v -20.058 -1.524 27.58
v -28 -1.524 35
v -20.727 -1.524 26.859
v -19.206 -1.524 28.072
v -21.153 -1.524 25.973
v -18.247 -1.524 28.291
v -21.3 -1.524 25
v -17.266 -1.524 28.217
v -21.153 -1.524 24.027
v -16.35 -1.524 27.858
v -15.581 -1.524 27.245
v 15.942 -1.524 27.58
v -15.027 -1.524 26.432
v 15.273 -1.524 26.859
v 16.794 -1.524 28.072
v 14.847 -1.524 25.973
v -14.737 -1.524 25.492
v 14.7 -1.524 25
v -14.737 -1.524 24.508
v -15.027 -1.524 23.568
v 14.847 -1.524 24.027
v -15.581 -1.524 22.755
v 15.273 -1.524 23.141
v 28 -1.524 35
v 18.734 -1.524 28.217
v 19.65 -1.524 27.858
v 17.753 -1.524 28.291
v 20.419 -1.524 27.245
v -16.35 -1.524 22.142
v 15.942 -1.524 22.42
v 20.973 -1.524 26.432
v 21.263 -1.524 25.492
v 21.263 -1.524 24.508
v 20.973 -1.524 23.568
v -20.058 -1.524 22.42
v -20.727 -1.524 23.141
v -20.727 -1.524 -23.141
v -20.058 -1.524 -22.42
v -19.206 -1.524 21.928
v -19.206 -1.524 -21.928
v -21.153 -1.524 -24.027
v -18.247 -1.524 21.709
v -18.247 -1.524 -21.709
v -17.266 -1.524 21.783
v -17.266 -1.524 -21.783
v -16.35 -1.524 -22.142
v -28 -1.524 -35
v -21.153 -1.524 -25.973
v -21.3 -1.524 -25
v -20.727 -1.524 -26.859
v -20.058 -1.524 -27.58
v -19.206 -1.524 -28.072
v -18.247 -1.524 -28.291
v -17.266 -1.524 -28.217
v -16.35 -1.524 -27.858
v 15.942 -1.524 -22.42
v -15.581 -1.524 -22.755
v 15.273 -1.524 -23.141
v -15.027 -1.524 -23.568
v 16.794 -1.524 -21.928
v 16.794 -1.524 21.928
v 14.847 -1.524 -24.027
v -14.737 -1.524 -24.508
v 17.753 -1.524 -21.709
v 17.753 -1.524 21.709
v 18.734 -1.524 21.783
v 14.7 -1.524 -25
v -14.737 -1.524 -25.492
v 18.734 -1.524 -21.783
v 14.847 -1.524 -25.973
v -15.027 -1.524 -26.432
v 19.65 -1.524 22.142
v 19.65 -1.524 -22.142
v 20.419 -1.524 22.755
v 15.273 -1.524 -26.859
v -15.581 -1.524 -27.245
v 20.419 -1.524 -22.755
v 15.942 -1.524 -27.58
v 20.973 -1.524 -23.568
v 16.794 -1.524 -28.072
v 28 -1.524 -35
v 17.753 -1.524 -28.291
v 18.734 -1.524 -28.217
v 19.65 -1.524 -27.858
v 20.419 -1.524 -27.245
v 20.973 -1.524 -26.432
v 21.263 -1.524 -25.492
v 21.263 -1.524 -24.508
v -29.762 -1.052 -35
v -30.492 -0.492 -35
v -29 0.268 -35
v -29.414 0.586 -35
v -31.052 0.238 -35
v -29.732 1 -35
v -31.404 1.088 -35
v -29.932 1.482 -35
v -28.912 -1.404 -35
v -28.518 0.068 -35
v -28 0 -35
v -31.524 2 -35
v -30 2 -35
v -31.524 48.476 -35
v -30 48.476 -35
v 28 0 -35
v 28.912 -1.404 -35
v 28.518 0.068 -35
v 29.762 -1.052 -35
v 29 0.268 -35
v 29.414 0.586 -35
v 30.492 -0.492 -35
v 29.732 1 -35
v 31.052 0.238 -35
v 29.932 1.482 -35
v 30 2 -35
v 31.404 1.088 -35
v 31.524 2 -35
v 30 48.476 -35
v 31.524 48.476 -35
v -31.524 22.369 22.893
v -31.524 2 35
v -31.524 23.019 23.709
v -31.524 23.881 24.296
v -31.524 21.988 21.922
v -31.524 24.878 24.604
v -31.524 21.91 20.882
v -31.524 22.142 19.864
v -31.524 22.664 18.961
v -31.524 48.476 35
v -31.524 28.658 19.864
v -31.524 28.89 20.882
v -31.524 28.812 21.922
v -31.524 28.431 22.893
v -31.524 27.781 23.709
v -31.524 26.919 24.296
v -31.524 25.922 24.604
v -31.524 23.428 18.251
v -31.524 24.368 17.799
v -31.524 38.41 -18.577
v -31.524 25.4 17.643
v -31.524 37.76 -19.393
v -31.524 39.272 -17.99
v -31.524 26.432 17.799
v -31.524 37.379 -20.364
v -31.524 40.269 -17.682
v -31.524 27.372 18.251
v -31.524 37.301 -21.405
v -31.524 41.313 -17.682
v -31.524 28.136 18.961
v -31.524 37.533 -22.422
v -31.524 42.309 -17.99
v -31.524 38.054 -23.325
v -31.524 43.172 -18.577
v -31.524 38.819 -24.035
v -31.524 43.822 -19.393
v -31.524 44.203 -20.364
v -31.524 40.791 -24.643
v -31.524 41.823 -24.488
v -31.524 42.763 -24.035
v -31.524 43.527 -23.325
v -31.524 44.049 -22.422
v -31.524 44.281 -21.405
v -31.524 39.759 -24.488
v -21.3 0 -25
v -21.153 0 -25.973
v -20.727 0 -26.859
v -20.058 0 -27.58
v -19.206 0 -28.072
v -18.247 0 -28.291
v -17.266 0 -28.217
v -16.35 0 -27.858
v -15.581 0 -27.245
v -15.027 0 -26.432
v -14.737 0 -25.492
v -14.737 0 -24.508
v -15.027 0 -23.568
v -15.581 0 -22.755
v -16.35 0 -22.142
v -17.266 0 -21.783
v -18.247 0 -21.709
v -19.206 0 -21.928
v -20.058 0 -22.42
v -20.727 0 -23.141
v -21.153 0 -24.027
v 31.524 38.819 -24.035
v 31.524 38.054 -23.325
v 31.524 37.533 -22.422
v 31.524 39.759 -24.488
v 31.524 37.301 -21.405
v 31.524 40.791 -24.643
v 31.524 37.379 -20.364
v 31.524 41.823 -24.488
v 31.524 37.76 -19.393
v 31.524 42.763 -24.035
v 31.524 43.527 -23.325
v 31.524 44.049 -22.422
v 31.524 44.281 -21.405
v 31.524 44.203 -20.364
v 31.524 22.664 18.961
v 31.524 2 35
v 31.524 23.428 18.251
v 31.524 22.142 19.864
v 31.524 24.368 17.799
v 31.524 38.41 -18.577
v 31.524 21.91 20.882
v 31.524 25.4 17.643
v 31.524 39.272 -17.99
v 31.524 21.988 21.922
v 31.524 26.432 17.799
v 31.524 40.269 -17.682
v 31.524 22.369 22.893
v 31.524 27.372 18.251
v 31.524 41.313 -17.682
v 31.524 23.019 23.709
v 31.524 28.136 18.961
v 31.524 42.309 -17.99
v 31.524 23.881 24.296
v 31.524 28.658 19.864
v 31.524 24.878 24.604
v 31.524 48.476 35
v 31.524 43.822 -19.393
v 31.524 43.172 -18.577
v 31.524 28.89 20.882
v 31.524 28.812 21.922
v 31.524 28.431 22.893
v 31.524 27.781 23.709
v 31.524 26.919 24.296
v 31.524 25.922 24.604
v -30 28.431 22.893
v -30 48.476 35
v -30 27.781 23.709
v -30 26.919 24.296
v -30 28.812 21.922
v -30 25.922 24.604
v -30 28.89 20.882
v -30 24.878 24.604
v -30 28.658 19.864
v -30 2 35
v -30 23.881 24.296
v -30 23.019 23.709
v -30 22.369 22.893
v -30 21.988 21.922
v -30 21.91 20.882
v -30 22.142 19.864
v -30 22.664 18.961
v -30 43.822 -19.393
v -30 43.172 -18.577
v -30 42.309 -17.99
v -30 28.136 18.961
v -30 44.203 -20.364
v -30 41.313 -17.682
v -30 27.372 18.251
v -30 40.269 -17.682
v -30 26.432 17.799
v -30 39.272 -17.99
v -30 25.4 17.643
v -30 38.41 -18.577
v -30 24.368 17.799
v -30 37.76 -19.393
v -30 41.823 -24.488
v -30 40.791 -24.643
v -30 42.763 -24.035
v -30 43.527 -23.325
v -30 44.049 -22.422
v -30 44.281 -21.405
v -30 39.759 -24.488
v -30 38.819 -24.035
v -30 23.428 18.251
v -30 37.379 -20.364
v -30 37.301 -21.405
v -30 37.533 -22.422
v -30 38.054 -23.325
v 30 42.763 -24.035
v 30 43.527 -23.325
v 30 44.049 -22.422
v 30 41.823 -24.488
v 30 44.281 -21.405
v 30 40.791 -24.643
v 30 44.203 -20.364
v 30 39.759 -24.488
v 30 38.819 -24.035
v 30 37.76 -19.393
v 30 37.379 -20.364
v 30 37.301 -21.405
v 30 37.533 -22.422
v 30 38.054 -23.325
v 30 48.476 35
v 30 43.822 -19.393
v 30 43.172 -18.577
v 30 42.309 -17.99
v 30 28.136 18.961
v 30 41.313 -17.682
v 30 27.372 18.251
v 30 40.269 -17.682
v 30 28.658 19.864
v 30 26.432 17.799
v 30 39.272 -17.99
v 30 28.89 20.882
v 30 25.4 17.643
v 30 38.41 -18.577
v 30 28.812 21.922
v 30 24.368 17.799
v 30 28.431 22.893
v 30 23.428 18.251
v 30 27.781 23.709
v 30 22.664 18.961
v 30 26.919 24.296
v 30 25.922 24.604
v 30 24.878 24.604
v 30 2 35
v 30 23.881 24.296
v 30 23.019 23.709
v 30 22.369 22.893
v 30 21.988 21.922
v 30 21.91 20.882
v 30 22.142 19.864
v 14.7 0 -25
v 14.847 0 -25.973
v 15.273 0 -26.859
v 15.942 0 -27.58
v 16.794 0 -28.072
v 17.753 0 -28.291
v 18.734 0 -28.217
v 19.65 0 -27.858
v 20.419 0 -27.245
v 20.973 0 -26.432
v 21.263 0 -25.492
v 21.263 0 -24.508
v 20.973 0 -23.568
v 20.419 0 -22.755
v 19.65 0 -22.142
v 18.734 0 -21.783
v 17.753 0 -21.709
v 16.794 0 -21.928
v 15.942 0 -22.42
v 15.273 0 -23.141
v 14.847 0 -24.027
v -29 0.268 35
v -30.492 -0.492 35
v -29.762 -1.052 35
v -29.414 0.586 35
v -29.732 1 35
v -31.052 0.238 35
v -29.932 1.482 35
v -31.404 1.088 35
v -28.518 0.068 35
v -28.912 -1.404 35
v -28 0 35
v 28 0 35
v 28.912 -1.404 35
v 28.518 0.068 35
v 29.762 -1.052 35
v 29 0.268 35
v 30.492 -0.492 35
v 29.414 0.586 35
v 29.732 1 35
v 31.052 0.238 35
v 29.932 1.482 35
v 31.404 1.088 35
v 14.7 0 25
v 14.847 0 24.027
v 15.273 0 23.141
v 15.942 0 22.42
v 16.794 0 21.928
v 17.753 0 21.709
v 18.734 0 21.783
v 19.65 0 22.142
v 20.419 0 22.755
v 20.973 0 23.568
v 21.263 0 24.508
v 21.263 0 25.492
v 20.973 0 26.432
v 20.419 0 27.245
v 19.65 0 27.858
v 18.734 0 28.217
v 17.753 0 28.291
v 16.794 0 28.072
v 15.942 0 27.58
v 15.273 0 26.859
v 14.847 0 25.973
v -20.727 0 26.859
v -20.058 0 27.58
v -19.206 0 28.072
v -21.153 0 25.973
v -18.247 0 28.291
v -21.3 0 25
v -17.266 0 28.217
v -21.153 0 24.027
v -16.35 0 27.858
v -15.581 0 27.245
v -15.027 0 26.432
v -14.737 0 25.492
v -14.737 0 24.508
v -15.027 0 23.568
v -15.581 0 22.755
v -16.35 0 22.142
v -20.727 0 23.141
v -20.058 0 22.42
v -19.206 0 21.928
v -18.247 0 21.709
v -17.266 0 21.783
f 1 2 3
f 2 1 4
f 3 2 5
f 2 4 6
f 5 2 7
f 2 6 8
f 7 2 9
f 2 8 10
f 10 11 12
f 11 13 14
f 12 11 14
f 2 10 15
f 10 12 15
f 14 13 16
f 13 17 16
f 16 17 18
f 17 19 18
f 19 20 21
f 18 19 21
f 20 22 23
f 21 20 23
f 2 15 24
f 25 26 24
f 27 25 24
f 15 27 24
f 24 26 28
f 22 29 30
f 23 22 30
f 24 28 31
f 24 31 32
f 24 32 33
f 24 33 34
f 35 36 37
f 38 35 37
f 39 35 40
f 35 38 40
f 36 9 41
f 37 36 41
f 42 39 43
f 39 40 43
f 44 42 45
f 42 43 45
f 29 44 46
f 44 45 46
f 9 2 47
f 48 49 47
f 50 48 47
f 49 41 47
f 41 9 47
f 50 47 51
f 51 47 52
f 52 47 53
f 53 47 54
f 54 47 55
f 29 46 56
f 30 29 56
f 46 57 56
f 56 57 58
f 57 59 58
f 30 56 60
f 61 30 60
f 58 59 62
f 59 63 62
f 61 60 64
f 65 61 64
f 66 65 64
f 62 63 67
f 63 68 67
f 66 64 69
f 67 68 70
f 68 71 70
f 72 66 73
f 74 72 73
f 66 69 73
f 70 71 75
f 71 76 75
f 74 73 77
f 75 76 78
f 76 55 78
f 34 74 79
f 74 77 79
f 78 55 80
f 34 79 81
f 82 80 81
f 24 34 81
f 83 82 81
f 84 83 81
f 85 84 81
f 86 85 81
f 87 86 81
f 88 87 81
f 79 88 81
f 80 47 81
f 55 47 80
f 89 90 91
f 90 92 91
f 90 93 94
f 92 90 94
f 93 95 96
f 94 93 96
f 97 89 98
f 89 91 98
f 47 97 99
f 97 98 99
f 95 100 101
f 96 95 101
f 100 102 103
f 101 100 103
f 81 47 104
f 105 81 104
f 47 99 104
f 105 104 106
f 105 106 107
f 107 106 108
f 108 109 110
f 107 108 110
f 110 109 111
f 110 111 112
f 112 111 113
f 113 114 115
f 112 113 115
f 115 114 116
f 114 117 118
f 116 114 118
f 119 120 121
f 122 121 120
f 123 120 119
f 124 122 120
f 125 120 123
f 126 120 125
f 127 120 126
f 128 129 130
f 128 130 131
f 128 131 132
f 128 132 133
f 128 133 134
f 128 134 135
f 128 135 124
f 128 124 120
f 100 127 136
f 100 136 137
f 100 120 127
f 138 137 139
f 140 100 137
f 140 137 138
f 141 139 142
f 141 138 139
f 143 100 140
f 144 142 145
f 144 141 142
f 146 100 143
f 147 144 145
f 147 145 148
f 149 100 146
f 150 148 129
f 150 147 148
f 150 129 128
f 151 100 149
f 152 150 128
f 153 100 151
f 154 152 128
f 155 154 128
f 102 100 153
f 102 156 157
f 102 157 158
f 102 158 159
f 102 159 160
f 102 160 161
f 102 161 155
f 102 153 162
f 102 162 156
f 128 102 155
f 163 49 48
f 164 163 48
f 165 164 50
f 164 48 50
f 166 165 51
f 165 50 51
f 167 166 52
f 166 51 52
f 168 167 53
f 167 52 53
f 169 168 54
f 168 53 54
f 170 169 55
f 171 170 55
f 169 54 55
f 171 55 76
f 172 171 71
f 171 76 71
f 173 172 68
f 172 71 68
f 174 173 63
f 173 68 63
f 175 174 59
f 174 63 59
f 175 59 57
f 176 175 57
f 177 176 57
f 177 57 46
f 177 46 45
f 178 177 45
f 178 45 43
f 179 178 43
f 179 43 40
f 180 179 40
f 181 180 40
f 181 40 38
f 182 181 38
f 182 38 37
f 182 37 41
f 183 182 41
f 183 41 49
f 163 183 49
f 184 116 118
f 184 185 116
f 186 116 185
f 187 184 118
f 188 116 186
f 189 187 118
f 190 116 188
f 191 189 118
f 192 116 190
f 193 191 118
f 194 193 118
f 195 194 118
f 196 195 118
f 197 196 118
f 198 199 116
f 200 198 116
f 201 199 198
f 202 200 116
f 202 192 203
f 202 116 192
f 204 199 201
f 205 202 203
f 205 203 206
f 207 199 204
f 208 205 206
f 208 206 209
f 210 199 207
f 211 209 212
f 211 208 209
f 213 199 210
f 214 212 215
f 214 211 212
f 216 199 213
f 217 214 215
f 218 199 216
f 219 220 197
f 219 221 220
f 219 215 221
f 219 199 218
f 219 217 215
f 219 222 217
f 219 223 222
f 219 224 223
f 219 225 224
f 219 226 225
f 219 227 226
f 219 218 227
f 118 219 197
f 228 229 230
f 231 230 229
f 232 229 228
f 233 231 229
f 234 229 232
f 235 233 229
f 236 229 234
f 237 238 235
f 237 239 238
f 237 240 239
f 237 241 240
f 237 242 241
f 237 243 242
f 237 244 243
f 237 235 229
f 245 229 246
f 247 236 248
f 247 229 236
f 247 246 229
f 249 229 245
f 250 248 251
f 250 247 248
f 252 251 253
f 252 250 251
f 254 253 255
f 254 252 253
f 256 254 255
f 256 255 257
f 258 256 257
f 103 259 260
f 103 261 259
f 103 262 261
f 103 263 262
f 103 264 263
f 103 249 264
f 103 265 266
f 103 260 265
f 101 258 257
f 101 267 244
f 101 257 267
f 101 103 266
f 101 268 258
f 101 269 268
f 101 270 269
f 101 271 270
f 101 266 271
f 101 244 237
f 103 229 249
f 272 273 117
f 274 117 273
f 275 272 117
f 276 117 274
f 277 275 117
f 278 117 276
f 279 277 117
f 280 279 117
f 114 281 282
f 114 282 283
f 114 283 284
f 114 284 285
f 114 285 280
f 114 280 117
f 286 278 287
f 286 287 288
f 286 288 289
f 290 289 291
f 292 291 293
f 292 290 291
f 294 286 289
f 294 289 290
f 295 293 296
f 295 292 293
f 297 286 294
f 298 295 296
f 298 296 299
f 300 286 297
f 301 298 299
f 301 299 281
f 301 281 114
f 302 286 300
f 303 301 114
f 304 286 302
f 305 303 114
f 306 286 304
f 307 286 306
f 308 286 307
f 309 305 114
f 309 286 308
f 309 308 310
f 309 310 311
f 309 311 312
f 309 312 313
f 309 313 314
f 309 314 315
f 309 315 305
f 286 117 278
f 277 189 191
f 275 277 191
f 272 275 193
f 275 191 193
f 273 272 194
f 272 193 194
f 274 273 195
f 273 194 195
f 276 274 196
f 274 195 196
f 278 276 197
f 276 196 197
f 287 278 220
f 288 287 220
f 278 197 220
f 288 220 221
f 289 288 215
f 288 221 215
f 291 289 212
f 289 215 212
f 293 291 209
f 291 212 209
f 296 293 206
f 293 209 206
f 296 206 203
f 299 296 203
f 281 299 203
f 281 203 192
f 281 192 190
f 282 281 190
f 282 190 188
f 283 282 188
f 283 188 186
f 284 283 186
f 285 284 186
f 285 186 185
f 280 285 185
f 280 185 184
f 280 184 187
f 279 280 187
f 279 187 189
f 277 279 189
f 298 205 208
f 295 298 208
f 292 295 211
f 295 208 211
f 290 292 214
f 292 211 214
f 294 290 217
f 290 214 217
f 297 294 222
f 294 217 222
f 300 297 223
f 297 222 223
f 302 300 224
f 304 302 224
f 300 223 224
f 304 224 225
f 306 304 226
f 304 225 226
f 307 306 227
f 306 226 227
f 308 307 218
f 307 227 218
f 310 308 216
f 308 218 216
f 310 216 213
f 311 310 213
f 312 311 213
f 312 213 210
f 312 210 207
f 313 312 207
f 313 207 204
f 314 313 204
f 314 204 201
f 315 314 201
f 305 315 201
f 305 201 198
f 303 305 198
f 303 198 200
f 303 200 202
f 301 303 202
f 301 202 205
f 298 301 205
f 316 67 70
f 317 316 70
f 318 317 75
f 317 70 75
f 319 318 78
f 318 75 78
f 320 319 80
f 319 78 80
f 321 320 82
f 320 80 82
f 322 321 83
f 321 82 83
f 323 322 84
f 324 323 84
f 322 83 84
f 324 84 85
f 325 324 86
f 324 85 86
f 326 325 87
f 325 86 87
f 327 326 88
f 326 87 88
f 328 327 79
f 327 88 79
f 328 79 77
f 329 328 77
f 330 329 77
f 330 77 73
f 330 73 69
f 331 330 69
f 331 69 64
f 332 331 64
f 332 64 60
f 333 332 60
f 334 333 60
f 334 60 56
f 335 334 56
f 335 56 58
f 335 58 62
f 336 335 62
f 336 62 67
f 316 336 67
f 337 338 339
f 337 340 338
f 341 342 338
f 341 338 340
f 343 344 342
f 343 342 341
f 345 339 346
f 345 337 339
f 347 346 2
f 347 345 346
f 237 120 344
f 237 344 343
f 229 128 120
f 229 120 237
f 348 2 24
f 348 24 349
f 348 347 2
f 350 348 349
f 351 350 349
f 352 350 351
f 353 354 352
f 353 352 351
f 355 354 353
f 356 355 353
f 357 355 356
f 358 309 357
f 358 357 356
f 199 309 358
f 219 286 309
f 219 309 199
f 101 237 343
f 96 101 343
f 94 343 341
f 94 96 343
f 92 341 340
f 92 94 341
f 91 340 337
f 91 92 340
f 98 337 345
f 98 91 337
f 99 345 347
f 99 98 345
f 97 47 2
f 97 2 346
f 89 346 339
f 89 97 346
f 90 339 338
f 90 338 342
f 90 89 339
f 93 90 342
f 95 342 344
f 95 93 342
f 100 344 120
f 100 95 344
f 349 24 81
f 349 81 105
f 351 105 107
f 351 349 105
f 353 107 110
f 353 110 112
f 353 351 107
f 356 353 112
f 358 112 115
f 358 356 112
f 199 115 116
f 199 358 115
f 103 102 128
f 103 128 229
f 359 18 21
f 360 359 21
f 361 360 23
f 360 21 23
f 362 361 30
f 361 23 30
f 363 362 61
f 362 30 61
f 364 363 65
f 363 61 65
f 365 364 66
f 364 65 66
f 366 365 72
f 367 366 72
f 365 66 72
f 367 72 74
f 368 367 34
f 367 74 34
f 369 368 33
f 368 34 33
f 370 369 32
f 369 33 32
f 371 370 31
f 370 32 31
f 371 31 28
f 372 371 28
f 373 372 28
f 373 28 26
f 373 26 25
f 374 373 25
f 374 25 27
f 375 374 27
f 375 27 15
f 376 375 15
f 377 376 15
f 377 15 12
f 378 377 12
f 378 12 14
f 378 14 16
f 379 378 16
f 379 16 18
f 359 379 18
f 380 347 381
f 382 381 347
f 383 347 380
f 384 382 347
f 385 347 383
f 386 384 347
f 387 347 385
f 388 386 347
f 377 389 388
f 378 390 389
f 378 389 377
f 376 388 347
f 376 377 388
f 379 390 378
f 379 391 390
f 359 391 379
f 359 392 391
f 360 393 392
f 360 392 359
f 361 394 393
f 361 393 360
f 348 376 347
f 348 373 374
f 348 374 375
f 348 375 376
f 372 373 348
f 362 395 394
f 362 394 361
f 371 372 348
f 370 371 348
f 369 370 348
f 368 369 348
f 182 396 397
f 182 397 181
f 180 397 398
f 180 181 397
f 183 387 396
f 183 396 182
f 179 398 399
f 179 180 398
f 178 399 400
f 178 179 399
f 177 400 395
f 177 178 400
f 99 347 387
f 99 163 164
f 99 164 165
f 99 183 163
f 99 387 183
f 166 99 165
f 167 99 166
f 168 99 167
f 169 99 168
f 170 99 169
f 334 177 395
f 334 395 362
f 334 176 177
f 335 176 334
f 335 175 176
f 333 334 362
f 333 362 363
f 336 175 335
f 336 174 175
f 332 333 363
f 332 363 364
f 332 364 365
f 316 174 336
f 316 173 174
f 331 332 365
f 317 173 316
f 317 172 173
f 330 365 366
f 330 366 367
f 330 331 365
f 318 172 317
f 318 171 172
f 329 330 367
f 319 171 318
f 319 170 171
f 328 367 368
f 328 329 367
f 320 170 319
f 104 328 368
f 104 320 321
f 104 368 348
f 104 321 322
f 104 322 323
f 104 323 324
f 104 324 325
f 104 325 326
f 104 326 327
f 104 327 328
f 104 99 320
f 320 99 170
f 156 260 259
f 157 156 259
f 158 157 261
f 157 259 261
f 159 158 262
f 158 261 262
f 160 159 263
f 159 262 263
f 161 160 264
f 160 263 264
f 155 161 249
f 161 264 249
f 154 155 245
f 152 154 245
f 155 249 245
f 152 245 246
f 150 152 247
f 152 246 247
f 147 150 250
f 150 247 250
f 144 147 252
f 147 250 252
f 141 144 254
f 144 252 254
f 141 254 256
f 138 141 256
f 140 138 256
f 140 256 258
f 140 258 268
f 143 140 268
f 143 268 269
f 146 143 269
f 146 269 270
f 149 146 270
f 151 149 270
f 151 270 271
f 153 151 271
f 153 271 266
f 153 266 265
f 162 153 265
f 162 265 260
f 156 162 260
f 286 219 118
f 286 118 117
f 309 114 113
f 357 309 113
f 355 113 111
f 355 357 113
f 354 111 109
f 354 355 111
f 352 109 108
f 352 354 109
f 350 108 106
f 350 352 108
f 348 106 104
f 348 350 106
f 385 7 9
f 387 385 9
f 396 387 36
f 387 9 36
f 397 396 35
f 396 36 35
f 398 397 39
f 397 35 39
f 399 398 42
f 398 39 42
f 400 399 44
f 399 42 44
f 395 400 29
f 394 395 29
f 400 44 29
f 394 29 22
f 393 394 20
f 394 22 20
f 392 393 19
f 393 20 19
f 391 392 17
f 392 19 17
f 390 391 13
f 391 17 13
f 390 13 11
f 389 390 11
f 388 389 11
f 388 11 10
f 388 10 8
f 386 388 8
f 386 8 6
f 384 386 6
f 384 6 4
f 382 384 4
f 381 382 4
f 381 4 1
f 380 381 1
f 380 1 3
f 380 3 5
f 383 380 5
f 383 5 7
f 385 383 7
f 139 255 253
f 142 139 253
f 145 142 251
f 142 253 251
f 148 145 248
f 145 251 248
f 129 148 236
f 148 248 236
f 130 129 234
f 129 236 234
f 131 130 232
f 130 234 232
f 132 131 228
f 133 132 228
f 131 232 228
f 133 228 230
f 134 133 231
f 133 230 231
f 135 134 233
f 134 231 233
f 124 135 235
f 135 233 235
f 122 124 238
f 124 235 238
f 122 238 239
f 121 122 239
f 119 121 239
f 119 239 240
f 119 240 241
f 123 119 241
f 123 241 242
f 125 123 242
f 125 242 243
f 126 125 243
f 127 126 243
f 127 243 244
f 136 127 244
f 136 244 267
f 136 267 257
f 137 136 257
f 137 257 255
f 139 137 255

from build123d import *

# Parameters (mm, degrees)
SKETCH1_W                      = 60
SKETCH1_H                      = 70
BASE_FLANGE3_DEPTH             = 1.524
EDGE_FLANGE1_STRIP_W           = 10.096
EDGE_FLANGE1_STRIP_H           = 1.524
EDGE_FLANGE1_STRIP_CUT_DEPTH   = 70
EDGE_FLANGE1_STRIP_2_W         = 10.096
EDGE_FLANGE1_STRIP_2_H         = 1.524
EDGE_FLANGE1_STRIP_CUT_2_DEPTH = 70
EDGE_FLANGE1_DEPTH             = 70
EDGE_FLANGE1_BEND_DEPTH        = 70
F_7_0_7_DIAMETER_HOLE1_D       = 7
M6_CLEARANCE_HOLE1_D           = 6.6


# Sheet-metal steps are written as plain solids
with BuildPart() as part:
    # Sketch1 → Base-Flange3 (new body)
    with BuildSketch(Plane(origin=(0, 0, 0), x_dir=(1, 0, 0), z_dir=(0, 1, 0))):
        Rectangle(SKETCH1_W, SKETCH1_H)
    extrude(amount=-BASE_FLANGE3_DEPTH)

    # Edge-Flange1 strip (across the edge) → Edge-Flange1 strip cut (cut)
    with BuildSketch(Plane(origin=(-30, 0, -35), x_dir=(1, 0, 0), z_dir=(0, 0, 1))):
        with Locations((-3.048, -0.762)):
            Rectangle(EDGE_FLANGE1_STRIP_W, EDGE_FLANGE1_STRIP_H)
    extrude(amount=EDGE_FLANGE1_STRIP_CUT_DEPTH, mode=Mode.SUBTRACT)

    # Edge-Flange1 strip 2 (across the edge) → Edge-Flange1 strip cut 2 (cut)
    with BuildSketch(Plane(origin=(30, 0, 35), x_dir=(-1, 0, 0), z_dir=(0, 0, -1))):
        with Locations((-3.048, -0.762)):
            Rectangle(EDGE_FLANGE1_STRIP_2_W, EDGE_FLANGE1_STRIP_2_H)
    extrude(amount=EDGE_FLANGE1_STRIP_CUT_2_DEPTH, mode=Mode.SUBTRACT)

    # Edge-Flange1 section (across the edge) → Edge-Flange1 (add)
    with BuildSketch(Plane(origin=(-30, 0, -35), x_dir=(1, 0, 0), z_dir=(0, 0, 1))):
        with BuildLine():
            Line((-1.524, 2), (-1.524, 48.476))
            Line((-1.524, 48.476), (0, 48.476))
            Line((0, 48.476), (0, 2))
            ThreePointArc((0, 2), (0.585786438, 0.585786438), (2, 0))
            Line((2, 0), (2, -1.524))
            ThreePointArc((2, -1.524), (-0.491844297, -0.491844297), (-1.524, 2))
        make_face()
    extrude(amount=EDGE_FLANGE1_DEPTH)

    # Edge-Flange1 section 2 (across the edge) → Edge-Flange1 bend (add)
    with BuildSketch(Plane(origin=(30, 0, 35), x_dir=(-1, 0, 0), z_dir=(0, 0, -1))):
        with BuildLine():
            Line((-1.524, 2), (-1.524, 48.476))
            Line((-1.524, 48.476), (0, 48.476))
            Line((0, 48.476), (0, 2))
            ThreePointArc((0, 2), (0.585786438, 0.585786438), (2, 0))
            Line((2, 0), (2, -1.524))
            ThreePointArc((2, -1.524), (-0.491844297, -0.491844297), (-1.524, 2))
        make_face()
    extrude(amount=EDGE_FLANGE1_BEND_DEPTH)

    # Ø7.0 (7) Diameter Hole1 (through all)
    with Locations(Plane.ZY.offset(31.524)):
        with Locations((21.143083968, 25.4), (-21.143083968, 40.79090645)):
            Hole(F_7_0_7_DIAMETER_HOLE1_D / 2)

    # M6 Clearance Hole1 (through all)
    with Locations(Plane(origin=(0, 0, 0), x_dir=(1, 0, 0), z_dir=(0, 1, 0))):
        with Locations((-18, -25), (18, -25), (18, 25), (-18, 25)):
            Hole(M6_CLEARANCE_HOLE1_D / 2)


solid = part.part
